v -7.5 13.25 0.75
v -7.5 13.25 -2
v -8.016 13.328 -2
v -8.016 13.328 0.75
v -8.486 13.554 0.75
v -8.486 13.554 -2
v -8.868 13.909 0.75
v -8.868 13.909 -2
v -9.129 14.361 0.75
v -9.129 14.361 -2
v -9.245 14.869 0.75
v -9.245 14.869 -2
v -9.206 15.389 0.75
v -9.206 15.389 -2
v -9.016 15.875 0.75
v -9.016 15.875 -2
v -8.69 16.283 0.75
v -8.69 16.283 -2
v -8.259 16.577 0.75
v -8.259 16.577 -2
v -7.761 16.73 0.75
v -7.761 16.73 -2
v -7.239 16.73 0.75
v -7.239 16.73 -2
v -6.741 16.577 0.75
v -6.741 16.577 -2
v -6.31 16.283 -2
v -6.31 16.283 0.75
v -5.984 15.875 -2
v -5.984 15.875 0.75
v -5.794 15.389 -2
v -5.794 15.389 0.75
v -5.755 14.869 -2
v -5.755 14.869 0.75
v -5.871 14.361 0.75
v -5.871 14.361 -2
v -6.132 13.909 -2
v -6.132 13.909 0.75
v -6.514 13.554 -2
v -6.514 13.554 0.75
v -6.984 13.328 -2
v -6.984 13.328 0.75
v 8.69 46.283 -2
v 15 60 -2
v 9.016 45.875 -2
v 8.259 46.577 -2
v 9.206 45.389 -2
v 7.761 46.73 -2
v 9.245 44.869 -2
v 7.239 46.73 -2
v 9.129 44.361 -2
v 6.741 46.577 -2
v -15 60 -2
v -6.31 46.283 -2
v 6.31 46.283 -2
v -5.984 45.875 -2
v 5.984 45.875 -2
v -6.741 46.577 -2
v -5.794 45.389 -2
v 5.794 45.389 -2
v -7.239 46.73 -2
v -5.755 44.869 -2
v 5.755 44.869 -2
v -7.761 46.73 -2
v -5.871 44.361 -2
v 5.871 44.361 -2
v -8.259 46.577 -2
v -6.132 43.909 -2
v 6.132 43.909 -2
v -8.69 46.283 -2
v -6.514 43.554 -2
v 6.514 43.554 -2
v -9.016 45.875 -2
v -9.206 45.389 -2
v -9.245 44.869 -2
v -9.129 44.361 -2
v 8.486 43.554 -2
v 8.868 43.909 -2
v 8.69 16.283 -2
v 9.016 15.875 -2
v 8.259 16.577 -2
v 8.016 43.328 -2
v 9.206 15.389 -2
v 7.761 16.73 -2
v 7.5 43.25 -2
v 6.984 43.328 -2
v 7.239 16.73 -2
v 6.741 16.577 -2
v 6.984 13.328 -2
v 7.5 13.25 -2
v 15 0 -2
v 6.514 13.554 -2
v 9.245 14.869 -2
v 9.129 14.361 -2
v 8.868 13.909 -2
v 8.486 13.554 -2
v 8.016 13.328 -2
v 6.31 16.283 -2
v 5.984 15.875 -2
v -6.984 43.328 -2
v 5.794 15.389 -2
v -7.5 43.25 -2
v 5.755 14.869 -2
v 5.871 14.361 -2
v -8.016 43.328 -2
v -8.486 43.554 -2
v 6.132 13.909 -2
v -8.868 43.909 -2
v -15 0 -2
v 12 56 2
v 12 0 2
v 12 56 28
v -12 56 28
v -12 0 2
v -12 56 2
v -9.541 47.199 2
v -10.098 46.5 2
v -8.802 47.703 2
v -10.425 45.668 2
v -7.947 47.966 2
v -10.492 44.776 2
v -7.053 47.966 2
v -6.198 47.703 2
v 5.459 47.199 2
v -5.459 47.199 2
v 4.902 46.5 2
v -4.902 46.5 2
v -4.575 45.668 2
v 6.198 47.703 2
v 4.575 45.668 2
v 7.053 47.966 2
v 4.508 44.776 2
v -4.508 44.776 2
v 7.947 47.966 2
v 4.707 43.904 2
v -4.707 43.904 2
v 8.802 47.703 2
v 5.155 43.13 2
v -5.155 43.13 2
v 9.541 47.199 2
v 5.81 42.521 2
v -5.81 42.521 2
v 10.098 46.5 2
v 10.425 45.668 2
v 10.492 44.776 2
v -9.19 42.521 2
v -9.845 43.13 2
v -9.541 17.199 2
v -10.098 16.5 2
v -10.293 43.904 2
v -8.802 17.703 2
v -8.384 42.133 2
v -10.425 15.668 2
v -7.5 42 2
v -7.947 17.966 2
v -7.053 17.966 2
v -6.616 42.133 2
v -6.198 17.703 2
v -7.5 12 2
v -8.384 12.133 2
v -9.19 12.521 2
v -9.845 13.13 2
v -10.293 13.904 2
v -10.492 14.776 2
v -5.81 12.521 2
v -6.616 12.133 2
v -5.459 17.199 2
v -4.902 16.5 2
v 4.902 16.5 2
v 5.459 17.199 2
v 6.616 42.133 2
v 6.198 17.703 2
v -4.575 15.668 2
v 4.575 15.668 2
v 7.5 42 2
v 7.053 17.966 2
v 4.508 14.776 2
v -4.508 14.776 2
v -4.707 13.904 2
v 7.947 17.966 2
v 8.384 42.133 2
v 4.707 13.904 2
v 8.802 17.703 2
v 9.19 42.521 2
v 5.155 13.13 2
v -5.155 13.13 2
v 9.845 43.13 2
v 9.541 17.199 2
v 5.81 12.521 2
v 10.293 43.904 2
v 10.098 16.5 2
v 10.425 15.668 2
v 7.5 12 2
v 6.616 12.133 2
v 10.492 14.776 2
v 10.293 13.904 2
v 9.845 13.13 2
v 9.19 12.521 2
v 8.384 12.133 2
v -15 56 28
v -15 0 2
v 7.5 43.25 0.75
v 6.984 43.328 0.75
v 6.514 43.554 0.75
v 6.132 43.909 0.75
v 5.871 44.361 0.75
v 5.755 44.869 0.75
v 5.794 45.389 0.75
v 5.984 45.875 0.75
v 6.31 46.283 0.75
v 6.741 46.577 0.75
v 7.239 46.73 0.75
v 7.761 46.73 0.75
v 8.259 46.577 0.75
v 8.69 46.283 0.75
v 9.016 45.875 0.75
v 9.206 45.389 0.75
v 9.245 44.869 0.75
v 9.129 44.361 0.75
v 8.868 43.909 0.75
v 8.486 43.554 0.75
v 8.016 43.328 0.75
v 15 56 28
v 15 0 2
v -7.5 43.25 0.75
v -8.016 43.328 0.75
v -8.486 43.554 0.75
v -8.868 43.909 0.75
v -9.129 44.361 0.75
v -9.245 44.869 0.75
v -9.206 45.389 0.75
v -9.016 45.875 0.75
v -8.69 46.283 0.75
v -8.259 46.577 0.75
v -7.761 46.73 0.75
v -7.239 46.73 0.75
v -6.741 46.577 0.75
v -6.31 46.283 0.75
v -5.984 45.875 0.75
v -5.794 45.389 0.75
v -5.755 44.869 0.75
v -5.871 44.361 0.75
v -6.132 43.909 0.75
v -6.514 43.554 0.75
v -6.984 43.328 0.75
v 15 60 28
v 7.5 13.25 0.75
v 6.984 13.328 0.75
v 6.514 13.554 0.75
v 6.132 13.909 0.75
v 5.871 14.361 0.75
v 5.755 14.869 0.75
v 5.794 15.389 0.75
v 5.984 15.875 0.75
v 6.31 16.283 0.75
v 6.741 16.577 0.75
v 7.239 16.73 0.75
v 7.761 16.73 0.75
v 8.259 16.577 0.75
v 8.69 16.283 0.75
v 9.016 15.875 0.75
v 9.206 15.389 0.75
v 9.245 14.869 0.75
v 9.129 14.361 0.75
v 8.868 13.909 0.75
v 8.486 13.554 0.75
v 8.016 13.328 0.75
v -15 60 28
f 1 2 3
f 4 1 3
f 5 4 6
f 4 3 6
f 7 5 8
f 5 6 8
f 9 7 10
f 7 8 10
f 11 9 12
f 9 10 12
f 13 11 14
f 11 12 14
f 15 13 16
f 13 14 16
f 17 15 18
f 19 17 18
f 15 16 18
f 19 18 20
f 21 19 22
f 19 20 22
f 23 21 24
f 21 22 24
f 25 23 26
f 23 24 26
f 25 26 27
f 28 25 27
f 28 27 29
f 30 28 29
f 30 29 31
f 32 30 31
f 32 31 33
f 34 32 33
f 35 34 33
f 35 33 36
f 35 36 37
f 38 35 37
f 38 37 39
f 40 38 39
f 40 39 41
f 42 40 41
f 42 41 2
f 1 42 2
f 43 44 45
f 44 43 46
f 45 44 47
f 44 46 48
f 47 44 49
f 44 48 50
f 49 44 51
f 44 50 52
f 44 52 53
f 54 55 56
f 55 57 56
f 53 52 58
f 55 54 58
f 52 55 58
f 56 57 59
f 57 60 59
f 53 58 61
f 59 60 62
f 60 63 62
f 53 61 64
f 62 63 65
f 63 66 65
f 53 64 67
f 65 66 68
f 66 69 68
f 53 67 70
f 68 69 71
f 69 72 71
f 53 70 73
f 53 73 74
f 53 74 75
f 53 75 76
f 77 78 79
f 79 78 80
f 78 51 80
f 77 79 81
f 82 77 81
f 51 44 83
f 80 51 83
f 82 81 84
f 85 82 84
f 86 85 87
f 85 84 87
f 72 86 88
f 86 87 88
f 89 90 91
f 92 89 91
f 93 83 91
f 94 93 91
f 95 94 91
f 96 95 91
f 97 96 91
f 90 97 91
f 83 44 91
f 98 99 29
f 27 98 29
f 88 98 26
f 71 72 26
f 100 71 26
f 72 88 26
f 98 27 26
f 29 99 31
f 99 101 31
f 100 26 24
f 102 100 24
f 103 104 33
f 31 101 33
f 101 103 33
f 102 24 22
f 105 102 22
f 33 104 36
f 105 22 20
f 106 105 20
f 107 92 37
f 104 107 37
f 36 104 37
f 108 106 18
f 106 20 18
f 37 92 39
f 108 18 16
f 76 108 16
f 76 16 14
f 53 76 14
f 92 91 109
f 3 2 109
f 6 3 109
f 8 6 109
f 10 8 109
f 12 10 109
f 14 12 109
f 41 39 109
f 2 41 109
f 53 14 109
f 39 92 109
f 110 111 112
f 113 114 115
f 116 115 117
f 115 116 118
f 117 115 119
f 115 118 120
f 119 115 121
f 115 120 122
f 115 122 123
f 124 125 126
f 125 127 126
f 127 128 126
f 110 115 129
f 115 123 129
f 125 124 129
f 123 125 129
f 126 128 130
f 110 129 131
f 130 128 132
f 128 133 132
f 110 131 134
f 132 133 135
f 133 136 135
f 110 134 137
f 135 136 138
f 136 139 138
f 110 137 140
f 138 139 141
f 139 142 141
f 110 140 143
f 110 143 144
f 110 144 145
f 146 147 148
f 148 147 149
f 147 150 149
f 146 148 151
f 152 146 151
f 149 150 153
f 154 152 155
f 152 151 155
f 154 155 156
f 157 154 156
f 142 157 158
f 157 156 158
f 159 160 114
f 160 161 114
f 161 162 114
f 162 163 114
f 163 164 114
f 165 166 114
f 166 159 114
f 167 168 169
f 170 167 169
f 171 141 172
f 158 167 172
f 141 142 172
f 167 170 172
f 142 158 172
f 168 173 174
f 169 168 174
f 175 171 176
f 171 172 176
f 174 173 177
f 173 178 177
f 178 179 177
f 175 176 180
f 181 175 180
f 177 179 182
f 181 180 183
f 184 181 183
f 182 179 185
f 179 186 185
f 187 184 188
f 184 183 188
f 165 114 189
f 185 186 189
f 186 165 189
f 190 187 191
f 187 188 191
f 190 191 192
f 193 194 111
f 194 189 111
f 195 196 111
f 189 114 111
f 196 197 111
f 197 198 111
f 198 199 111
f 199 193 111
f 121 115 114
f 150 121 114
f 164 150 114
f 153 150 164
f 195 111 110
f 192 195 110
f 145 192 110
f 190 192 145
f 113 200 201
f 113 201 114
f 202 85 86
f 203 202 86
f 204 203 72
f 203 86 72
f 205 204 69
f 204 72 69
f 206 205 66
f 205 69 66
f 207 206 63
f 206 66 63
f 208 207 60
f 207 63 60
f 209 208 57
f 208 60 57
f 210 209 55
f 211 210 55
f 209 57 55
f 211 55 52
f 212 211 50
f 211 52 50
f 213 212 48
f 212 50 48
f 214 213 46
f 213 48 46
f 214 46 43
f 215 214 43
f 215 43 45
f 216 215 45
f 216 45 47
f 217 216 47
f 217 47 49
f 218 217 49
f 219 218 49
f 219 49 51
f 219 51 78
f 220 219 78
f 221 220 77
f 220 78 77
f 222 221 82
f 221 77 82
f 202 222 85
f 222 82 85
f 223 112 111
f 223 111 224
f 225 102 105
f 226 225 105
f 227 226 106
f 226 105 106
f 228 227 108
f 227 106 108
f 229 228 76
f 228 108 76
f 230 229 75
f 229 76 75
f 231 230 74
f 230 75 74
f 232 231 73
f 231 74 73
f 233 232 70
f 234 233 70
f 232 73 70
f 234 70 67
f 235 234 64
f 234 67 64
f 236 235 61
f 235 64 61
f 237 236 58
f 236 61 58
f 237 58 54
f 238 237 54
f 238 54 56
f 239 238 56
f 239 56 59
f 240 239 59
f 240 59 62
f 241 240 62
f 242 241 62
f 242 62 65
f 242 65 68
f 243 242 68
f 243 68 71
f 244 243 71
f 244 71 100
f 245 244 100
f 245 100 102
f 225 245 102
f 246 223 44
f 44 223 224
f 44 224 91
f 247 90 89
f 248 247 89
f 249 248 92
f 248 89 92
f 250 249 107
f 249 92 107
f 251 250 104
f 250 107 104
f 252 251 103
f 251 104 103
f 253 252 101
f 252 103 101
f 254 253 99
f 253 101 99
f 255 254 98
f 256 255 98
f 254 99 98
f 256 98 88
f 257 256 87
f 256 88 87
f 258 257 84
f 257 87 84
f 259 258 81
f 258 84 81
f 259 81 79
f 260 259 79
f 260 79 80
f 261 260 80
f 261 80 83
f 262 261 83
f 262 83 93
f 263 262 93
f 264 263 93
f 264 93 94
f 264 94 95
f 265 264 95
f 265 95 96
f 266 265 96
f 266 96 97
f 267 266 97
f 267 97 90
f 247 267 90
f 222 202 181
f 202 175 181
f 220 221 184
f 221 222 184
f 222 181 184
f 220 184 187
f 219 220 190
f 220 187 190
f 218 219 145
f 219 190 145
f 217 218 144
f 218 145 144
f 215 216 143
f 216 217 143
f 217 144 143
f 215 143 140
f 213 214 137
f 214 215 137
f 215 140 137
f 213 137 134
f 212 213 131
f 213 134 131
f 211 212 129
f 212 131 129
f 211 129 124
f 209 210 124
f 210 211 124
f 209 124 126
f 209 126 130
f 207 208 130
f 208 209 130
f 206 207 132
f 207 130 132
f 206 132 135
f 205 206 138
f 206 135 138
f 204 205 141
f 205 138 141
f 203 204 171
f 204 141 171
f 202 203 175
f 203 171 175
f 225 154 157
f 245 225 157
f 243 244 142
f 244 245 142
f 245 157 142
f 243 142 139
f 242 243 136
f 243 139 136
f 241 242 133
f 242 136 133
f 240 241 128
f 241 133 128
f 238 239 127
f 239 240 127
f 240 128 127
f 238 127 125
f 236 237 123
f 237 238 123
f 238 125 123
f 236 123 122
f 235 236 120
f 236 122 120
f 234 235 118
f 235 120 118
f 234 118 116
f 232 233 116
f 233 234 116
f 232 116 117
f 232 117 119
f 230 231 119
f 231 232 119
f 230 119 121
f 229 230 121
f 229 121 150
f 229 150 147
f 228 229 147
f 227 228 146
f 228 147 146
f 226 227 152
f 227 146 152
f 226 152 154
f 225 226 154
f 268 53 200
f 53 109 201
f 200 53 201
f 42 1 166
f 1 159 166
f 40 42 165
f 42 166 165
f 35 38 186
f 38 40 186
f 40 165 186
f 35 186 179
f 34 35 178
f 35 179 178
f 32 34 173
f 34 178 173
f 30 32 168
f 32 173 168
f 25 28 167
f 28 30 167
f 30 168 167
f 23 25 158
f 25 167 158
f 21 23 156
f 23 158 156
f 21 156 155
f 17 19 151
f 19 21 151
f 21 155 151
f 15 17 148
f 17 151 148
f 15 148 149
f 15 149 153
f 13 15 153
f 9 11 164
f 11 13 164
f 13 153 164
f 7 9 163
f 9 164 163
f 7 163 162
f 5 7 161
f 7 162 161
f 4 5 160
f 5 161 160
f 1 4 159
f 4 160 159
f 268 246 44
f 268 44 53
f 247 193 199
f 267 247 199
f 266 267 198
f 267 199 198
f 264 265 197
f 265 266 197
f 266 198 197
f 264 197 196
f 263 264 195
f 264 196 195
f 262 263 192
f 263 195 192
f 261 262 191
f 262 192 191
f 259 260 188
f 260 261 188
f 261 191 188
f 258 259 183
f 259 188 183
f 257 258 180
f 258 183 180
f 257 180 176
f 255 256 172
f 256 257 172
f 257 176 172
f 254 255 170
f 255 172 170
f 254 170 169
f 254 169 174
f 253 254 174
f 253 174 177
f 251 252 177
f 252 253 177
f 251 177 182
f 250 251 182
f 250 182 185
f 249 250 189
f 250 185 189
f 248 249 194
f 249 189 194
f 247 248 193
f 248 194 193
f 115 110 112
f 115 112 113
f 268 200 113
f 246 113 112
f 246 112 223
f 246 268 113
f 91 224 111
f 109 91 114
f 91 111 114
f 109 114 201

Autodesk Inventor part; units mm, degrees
ref_plane "YZ Plane" through (0, 0, 0) normal (1, 0, 0) x (0, 1, 0)
ref_plane "XZ Plane" through (0, 0, 0) normal (0, 1, 0) x (-1, 0, 0)
ref_plane "XY Plane" through (0, 0, 0) normal (0, 0, 1) x (1, 0, 0)
sketch "Boceto1" plane through (0, 0, 0) normal (0, 1, 0) x (-1, 0, 0)
  line L0 (-15, -2) -> (15, -2)
  line L1 (15, -2) -> (15, 2)
  line L2 (15, 2) -> (-15, 2)
  line L3 (-15, 2) -> (-15, -2)
  line L4 (-15, -2) -> (15, 2) construction
  line L5 (15, -2) -> (-15, 2) construction
  point P0 (0, 0)
  dimension "d0" = 30
  dimension "d1" = 4
extrude "Extrusión1" add sketch "Boceto1" along normal blind 60
sketch "Boceto2" plane through (-15, 0, 2) normal (0, 0, 1) x (1, 0, 0)
  line L0 (0, 60) -> (30, 60) projected
  line L1 (30, 0) -> (30, 60) projected
  line L2 (0, 60) -> (30, 60)
  line L3 (30, 60) -> (30, 56)
  line L4 (30, 56) -> (0, 56)
  line L5 (0, 56) -> (0, 60)
  point P0 (15, 0)
  dimension "d4" = 4
extrude "Extrusión2" add sketch "Boceto2" along normal blind 26
sketch "Boceto3" plane through (-15, 0, 2) normal (0, 0, 1) x (1, 0, 0)
  line L0 (0, 0) -> (30, 0) projected
  line L1 (0, 56) -> (30, 56) projected
  line L2 (0, 0) -> (3, 0)
  line L3 (3, 0) -> (3, 56)
  line L4 (3, 56) -> (0, 56)
  line L5 (0, 56) -> (0, 0)
  line L6 (30, 0) -> (27, 0)
  line L7 (27, 0) -> (27, 56)
  line L8 (27, 56) -> (30, 56)
  line L9 (30, 56) -> (30, 0)
  point P0 (15, 0)
  point P1 (3, 0)
  dimension "d7" = 3
  dimension "d8" = 3
extrude "Extrusión3" add sketch "Boceto3" along normal blind 26 contours L5 L1 L3 L0 | L7 L1 L9 L0
chamfer "Chaflán1" distance 56 distance2 26 2 edges at (-13.5, 0, 28) (13.5, 0, 28) measured on face at (-14, 38.6667, 28)
sketch "Boceto4" plane through (-12, 56, 2) normal (0, 0, 1) x (1, 0, 0)
  line L0 (27, -56) -> (-3, -56) projected
  line L1 (-3, -56) -> (-3, 4) projected
  line L2 (27, 4) -> (-3, 4) projected
  line L3 (27, -56) -> (27, 4) projected
  line L4 (-3, -56) -> (-3, 4) projected
  line L5 (-3, 4) -> (27, 4)
  line L6 (27, 4) -> (27, -11)
  line L7 (27, -11) -> (-3, -11)
  line L8 (-3, -11) -> (-3, 4)
  line L9 (12, -11) -> (-3, -11)
  line L10 (12, -11) -> (27, -11)
  circle A0 centre (4.5, -11) radius 1.75
  circle A1 centre (19.5, -11) radius 1.75
  line L11 (-3, -56) -> (27, -56)
  line L12 (27, -56) -> (27, -41)
  line L13 (27, -41) -> (-3, -41)
  line L14 (-3, -41) -> (-3, -56)
  line L15 (-3, -41) -> (12, -41)
  line L16 (12, -41) -> (27, -41)
  circle A2 centre (4.5, -41) radius 1.75
  circle A3 centre (19.5, -41) radius 1.75
  point P0 (12, -56)
  dimension "d14" = 30
  dimension "d15" = 15
  dimension "d16" = 3.5
  dimension "d17" = 3.5
  dimension "d18" = 30
  dimension "d19" = 15
  dimension "d20" = 15
  dimension "d21" = 15
  dimension "d22" = 3.5
  dimension "d23" = 3.5
hole "Agujero1" at (-7.5, 15, 2) at (7.5, 15, 2) at (7.5, 45, 2) at (-7.5, 45, 2) direction (0, 0, -1) diameter 3.5 end through all countersink diameter 6 countersink angle 90
properties part number "UnionBarras"
